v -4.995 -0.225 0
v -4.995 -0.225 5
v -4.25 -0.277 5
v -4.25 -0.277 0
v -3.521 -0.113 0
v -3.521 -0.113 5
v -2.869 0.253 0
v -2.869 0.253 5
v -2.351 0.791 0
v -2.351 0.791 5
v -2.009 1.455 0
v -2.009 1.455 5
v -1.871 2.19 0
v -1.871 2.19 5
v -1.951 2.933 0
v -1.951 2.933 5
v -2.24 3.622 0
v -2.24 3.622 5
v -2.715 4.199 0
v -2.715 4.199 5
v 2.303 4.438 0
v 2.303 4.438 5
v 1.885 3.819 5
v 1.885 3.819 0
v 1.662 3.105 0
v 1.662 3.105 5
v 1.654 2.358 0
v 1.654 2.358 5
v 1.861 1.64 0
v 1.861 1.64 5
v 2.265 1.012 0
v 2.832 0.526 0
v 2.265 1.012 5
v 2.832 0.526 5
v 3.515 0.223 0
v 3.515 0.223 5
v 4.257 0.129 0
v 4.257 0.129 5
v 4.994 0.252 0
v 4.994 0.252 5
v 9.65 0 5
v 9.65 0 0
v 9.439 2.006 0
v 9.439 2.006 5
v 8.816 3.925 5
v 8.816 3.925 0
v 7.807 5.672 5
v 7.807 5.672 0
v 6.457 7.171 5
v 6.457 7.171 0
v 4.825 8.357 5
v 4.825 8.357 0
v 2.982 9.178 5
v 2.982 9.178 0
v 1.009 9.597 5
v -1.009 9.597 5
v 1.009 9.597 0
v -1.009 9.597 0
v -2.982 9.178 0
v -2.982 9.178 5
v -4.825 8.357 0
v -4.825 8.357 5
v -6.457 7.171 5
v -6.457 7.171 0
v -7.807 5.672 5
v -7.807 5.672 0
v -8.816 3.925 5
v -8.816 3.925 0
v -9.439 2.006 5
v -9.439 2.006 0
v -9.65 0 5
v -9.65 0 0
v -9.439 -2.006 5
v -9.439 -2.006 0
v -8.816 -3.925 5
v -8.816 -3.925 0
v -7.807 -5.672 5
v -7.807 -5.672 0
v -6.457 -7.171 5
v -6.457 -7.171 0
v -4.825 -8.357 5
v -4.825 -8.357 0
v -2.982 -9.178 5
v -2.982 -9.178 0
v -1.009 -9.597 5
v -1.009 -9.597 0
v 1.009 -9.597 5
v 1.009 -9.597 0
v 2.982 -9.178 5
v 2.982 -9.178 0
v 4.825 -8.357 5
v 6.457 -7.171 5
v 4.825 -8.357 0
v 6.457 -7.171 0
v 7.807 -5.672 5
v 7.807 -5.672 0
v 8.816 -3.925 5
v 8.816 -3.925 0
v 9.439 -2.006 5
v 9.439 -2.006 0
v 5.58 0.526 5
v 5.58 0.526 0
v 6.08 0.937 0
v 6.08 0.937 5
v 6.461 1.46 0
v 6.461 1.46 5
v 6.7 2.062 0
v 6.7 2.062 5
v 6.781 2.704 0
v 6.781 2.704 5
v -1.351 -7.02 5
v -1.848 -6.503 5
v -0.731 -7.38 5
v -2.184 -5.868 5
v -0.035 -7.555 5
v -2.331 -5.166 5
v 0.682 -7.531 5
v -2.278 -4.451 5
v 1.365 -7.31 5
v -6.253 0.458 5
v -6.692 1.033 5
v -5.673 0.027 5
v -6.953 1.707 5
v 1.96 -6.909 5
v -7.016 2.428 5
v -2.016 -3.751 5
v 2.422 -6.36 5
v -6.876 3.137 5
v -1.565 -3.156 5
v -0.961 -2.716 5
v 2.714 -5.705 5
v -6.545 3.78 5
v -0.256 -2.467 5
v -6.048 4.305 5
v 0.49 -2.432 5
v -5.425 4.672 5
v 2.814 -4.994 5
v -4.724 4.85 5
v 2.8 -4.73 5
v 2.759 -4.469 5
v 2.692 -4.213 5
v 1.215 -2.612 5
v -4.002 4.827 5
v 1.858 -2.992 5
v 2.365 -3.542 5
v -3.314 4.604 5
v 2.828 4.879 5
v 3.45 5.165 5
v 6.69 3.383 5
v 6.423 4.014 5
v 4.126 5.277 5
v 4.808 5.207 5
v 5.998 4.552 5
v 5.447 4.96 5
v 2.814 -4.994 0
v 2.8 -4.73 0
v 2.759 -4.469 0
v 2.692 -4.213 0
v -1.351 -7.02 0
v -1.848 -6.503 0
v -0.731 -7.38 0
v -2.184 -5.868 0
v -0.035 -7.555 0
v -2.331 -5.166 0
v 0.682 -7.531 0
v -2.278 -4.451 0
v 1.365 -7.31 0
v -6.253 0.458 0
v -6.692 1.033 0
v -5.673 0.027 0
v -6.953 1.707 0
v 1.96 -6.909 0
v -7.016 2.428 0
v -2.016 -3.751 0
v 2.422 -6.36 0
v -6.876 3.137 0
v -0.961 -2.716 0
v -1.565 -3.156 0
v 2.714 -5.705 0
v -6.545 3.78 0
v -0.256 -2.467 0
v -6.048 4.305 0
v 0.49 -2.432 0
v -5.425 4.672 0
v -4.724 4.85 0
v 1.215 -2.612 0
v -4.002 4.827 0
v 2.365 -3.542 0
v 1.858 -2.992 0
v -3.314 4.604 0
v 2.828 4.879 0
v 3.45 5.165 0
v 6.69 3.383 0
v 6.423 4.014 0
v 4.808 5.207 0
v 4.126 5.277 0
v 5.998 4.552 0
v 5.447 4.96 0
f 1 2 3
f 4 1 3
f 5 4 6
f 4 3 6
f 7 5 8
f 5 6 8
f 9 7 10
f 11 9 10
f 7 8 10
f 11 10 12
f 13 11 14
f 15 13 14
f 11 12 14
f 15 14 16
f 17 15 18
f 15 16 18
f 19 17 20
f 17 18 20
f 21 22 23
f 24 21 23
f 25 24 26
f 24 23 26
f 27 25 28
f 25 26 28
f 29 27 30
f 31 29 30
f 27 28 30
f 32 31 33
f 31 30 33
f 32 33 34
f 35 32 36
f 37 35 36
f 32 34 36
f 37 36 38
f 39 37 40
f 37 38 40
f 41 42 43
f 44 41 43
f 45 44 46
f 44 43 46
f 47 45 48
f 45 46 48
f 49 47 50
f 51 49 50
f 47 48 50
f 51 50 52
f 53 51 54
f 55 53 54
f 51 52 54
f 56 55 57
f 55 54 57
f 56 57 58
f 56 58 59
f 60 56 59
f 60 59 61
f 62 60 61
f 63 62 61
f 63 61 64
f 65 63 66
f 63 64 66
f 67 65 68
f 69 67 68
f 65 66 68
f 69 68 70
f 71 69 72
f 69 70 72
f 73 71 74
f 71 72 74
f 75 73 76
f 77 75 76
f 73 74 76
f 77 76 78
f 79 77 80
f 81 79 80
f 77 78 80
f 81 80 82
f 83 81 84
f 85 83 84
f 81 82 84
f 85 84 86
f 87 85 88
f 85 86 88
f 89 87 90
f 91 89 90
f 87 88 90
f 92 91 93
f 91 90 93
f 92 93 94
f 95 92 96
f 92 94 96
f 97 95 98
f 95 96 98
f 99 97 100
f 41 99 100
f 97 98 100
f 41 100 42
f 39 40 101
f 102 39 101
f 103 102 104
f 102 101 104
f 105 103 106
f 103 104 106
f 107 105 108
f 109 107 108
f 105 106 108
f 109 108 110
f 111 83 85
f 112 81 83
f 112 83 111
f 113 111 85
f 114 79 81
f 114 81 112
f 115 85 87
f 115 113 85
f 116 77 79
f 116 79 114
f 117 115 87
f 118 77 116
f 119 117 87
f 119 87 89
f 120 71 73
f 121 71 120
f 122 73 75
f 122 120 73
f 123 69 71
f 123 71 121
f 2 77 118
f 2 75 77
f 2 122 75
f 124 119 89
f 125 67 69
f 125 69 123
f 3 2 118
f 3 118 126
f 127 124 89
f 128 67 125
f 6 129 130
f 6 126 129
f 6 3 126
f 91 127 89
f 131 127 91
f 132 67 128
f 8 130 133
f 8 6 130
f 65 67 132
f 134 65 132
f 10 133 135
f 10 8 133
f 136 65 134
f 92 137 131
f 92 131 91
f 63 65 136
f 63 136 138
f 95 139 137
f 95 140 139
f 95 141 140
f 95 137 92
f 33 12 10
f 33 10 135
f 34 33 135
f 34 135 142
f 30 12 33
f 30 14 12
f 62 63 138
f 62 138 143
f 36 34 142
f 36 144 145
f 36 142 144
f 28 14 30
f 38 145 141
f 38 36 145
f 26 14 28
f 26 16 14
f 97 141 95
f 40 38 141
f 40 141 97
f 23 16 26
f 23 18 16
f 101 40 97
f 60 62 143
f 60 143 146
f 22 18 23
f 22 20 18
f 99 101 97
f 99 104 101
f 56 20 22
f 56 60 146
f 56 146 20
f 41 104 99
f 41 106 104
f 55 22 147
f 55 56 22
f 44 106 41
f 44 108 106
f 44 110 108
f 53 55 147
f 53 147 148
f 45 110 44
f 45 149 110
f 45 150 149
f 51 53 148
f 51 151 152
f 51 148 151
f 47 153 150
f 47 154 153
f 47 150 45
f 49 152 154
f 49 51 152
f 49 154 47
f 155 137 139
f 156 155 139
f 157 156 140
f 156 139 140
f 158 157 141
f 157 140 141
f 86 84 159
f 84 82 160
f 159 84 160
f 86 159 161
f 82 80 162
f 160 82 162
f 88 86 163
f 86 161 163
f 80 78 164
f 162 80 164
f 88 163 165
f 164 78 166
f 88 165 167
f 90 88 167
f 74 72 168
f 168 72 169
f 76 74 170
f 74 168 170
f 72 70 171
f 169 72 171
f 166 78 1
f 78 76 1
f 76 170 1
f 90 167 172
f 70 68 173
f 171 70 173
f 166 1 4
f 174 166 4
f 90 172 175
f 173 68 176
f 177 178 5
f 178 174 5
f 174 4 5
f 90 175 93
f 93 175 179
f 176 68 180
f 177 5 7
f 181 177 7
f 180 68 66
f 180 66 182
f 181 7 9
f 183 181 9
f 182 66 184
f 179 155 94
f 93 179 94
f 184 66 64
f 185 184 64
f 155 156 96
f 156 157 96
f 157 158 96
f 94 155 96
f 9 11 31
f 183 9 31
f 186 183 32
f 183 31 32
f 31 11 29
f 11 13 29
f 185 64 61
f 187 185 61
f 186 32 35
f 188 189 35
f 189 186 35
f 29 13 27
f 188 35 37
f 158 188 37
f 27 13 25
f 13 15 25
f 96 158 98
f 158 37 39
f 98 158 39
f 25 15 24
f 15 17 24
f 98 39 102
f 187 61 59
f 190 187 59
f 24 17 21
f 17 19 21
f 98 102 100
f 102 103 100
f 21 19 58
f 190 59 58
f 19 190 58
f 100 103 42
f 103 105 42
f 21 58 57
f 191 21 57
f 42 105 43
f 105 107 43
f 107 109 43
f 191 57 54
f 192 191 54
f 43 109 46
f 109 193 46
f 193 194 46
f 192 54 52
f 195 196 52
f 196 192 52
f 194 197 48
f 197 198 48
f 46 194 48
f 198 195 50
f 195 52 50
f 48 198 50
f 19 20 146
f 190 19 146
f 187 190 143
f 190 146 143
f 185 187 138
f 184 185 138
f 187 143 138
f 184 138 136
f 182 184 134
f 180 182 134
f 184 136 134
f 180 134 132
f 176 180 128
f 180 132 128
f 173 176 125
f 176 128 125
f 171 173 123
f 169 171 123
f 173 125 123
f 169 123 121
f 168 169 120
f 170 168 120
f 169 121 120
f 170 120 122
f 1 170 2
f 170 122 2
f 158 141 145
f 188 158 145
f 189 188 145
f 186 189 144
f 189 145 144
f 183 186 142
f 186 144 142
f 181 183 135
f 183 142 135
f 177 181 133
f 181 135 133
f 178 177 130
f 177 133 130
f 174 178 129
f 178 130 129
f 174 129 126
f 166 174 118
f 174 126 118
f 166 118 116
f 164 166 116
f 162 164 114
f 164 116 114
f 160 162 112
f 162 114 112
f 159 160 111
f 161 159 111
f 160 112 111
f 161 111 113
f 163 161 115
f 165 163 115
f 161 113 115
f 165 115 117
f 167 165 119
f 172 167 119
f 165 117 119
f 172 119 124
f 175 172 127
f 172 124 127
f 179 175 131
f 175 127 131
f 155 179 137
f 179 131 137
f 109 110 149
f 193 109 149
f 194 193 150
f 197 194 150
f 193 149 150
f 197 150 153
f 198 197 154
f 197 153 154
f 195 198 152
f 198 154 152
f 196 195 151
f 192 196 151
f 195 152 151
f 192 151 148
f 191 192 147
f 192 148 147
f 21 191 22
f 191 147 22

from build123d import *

# Parameters (mm, degrees)
F0_R     = 9.65
F1_DEPTH = 5
F3_DEPTH = 5.001


with BuildPart() as f1:
    # F0 (on Top) → F1 (new body)
    with BuildSketch(Plane.XY):
        Circle(F0_R)
    extrude(amount=F1_DEPTH)

    # F2 (on face) → F3 (cut, through all)
    with BuildSketch(Plane.XY.offset(5)):
        with BuildLine():
            ThreePointArc((2.3027162866, 4.4381863079), (2.0398793124, 1.311303699), (4.9936375982, 0.252157763))
            ThreePointArc((4.9936375982, 0.252157763), (4.2059367266, 2.7037189669), (2.3027162866, 4.4381863079))
        make_face()
        with BuildLine():
            ThreePointArc((2.3027162866, 4.4381863079), (4.2059367266, 2.7037189669), (4.9936375982, 0.252157763))
            ThreePointArc((4.9936375982, 0.252157763), (6.286676348, 1.1867655636), (6.7809367266, 2.7037189669))
            ThreePointArc((6.7809367266, 2.7037189669), (5.1359454274, 5.1049080091), (2.3027162866, 4.4381863079))
        make_face()
        with BuildLine():
            ThreePointArc((2.8135209468, -4.9943075354), (2.783016007, -4.5991241749), (2.692223946, -4.2133039558))
            ThreePointArc((2.692223946, -4.2133039558), (0.2385209468, -4.9943075354), (-2.2784437706, -4.4506958988))
            ThreePointArc((-2.2784437706, -4.4506958988), (-0.0348294261, -7.5547576079), (2.8135209468, -4.9943075354))
        make_face()
        with BuildLine():
            ThreePointArc((-2.2784437706, -4.4506958988), (0.2385209468, -4.9943075354), (2.692223946, -4.2133039558))
            ThreePointArc((2.692223946, -4.2133039558), (0.1156826592, -2.4222391547), (-2.2784437706, -4.4506958988))
        make_face()
        with BuildLine():
            ThreePointArc((-1.8694576733, 2.2905885685), (-2.090367679, 3.3340852377), (-2.7151938276, 4.1985381359))
            ThreePointArc((-2.7151938276, 4.1985381359), (-4.4444576733, 2.2905885685), (-4.9949402326, -0.224882352))
            ThreePointArc((-4.9949402326, -0.224882352), (-2.8299713139, 0.2845828867), (-1.8694576733, 2.2905885685))
        make_face()
        with BuildLine():
            ThreePointArc((-4.9949402326, -0.224882352), (-4.4444576733, 2.2905885685), (-2.7151938276, 4.1985381359))
            ThreePointArc((-2.7151938276, 4.1985381359), (-6.7333533751, 3.4702416812), (-4.9949402326, -0.224882352))
        make_face()
    extrude(amount=-F3_DEPTH, mode=Mode.SUBTRACT)


solid = f1.part
